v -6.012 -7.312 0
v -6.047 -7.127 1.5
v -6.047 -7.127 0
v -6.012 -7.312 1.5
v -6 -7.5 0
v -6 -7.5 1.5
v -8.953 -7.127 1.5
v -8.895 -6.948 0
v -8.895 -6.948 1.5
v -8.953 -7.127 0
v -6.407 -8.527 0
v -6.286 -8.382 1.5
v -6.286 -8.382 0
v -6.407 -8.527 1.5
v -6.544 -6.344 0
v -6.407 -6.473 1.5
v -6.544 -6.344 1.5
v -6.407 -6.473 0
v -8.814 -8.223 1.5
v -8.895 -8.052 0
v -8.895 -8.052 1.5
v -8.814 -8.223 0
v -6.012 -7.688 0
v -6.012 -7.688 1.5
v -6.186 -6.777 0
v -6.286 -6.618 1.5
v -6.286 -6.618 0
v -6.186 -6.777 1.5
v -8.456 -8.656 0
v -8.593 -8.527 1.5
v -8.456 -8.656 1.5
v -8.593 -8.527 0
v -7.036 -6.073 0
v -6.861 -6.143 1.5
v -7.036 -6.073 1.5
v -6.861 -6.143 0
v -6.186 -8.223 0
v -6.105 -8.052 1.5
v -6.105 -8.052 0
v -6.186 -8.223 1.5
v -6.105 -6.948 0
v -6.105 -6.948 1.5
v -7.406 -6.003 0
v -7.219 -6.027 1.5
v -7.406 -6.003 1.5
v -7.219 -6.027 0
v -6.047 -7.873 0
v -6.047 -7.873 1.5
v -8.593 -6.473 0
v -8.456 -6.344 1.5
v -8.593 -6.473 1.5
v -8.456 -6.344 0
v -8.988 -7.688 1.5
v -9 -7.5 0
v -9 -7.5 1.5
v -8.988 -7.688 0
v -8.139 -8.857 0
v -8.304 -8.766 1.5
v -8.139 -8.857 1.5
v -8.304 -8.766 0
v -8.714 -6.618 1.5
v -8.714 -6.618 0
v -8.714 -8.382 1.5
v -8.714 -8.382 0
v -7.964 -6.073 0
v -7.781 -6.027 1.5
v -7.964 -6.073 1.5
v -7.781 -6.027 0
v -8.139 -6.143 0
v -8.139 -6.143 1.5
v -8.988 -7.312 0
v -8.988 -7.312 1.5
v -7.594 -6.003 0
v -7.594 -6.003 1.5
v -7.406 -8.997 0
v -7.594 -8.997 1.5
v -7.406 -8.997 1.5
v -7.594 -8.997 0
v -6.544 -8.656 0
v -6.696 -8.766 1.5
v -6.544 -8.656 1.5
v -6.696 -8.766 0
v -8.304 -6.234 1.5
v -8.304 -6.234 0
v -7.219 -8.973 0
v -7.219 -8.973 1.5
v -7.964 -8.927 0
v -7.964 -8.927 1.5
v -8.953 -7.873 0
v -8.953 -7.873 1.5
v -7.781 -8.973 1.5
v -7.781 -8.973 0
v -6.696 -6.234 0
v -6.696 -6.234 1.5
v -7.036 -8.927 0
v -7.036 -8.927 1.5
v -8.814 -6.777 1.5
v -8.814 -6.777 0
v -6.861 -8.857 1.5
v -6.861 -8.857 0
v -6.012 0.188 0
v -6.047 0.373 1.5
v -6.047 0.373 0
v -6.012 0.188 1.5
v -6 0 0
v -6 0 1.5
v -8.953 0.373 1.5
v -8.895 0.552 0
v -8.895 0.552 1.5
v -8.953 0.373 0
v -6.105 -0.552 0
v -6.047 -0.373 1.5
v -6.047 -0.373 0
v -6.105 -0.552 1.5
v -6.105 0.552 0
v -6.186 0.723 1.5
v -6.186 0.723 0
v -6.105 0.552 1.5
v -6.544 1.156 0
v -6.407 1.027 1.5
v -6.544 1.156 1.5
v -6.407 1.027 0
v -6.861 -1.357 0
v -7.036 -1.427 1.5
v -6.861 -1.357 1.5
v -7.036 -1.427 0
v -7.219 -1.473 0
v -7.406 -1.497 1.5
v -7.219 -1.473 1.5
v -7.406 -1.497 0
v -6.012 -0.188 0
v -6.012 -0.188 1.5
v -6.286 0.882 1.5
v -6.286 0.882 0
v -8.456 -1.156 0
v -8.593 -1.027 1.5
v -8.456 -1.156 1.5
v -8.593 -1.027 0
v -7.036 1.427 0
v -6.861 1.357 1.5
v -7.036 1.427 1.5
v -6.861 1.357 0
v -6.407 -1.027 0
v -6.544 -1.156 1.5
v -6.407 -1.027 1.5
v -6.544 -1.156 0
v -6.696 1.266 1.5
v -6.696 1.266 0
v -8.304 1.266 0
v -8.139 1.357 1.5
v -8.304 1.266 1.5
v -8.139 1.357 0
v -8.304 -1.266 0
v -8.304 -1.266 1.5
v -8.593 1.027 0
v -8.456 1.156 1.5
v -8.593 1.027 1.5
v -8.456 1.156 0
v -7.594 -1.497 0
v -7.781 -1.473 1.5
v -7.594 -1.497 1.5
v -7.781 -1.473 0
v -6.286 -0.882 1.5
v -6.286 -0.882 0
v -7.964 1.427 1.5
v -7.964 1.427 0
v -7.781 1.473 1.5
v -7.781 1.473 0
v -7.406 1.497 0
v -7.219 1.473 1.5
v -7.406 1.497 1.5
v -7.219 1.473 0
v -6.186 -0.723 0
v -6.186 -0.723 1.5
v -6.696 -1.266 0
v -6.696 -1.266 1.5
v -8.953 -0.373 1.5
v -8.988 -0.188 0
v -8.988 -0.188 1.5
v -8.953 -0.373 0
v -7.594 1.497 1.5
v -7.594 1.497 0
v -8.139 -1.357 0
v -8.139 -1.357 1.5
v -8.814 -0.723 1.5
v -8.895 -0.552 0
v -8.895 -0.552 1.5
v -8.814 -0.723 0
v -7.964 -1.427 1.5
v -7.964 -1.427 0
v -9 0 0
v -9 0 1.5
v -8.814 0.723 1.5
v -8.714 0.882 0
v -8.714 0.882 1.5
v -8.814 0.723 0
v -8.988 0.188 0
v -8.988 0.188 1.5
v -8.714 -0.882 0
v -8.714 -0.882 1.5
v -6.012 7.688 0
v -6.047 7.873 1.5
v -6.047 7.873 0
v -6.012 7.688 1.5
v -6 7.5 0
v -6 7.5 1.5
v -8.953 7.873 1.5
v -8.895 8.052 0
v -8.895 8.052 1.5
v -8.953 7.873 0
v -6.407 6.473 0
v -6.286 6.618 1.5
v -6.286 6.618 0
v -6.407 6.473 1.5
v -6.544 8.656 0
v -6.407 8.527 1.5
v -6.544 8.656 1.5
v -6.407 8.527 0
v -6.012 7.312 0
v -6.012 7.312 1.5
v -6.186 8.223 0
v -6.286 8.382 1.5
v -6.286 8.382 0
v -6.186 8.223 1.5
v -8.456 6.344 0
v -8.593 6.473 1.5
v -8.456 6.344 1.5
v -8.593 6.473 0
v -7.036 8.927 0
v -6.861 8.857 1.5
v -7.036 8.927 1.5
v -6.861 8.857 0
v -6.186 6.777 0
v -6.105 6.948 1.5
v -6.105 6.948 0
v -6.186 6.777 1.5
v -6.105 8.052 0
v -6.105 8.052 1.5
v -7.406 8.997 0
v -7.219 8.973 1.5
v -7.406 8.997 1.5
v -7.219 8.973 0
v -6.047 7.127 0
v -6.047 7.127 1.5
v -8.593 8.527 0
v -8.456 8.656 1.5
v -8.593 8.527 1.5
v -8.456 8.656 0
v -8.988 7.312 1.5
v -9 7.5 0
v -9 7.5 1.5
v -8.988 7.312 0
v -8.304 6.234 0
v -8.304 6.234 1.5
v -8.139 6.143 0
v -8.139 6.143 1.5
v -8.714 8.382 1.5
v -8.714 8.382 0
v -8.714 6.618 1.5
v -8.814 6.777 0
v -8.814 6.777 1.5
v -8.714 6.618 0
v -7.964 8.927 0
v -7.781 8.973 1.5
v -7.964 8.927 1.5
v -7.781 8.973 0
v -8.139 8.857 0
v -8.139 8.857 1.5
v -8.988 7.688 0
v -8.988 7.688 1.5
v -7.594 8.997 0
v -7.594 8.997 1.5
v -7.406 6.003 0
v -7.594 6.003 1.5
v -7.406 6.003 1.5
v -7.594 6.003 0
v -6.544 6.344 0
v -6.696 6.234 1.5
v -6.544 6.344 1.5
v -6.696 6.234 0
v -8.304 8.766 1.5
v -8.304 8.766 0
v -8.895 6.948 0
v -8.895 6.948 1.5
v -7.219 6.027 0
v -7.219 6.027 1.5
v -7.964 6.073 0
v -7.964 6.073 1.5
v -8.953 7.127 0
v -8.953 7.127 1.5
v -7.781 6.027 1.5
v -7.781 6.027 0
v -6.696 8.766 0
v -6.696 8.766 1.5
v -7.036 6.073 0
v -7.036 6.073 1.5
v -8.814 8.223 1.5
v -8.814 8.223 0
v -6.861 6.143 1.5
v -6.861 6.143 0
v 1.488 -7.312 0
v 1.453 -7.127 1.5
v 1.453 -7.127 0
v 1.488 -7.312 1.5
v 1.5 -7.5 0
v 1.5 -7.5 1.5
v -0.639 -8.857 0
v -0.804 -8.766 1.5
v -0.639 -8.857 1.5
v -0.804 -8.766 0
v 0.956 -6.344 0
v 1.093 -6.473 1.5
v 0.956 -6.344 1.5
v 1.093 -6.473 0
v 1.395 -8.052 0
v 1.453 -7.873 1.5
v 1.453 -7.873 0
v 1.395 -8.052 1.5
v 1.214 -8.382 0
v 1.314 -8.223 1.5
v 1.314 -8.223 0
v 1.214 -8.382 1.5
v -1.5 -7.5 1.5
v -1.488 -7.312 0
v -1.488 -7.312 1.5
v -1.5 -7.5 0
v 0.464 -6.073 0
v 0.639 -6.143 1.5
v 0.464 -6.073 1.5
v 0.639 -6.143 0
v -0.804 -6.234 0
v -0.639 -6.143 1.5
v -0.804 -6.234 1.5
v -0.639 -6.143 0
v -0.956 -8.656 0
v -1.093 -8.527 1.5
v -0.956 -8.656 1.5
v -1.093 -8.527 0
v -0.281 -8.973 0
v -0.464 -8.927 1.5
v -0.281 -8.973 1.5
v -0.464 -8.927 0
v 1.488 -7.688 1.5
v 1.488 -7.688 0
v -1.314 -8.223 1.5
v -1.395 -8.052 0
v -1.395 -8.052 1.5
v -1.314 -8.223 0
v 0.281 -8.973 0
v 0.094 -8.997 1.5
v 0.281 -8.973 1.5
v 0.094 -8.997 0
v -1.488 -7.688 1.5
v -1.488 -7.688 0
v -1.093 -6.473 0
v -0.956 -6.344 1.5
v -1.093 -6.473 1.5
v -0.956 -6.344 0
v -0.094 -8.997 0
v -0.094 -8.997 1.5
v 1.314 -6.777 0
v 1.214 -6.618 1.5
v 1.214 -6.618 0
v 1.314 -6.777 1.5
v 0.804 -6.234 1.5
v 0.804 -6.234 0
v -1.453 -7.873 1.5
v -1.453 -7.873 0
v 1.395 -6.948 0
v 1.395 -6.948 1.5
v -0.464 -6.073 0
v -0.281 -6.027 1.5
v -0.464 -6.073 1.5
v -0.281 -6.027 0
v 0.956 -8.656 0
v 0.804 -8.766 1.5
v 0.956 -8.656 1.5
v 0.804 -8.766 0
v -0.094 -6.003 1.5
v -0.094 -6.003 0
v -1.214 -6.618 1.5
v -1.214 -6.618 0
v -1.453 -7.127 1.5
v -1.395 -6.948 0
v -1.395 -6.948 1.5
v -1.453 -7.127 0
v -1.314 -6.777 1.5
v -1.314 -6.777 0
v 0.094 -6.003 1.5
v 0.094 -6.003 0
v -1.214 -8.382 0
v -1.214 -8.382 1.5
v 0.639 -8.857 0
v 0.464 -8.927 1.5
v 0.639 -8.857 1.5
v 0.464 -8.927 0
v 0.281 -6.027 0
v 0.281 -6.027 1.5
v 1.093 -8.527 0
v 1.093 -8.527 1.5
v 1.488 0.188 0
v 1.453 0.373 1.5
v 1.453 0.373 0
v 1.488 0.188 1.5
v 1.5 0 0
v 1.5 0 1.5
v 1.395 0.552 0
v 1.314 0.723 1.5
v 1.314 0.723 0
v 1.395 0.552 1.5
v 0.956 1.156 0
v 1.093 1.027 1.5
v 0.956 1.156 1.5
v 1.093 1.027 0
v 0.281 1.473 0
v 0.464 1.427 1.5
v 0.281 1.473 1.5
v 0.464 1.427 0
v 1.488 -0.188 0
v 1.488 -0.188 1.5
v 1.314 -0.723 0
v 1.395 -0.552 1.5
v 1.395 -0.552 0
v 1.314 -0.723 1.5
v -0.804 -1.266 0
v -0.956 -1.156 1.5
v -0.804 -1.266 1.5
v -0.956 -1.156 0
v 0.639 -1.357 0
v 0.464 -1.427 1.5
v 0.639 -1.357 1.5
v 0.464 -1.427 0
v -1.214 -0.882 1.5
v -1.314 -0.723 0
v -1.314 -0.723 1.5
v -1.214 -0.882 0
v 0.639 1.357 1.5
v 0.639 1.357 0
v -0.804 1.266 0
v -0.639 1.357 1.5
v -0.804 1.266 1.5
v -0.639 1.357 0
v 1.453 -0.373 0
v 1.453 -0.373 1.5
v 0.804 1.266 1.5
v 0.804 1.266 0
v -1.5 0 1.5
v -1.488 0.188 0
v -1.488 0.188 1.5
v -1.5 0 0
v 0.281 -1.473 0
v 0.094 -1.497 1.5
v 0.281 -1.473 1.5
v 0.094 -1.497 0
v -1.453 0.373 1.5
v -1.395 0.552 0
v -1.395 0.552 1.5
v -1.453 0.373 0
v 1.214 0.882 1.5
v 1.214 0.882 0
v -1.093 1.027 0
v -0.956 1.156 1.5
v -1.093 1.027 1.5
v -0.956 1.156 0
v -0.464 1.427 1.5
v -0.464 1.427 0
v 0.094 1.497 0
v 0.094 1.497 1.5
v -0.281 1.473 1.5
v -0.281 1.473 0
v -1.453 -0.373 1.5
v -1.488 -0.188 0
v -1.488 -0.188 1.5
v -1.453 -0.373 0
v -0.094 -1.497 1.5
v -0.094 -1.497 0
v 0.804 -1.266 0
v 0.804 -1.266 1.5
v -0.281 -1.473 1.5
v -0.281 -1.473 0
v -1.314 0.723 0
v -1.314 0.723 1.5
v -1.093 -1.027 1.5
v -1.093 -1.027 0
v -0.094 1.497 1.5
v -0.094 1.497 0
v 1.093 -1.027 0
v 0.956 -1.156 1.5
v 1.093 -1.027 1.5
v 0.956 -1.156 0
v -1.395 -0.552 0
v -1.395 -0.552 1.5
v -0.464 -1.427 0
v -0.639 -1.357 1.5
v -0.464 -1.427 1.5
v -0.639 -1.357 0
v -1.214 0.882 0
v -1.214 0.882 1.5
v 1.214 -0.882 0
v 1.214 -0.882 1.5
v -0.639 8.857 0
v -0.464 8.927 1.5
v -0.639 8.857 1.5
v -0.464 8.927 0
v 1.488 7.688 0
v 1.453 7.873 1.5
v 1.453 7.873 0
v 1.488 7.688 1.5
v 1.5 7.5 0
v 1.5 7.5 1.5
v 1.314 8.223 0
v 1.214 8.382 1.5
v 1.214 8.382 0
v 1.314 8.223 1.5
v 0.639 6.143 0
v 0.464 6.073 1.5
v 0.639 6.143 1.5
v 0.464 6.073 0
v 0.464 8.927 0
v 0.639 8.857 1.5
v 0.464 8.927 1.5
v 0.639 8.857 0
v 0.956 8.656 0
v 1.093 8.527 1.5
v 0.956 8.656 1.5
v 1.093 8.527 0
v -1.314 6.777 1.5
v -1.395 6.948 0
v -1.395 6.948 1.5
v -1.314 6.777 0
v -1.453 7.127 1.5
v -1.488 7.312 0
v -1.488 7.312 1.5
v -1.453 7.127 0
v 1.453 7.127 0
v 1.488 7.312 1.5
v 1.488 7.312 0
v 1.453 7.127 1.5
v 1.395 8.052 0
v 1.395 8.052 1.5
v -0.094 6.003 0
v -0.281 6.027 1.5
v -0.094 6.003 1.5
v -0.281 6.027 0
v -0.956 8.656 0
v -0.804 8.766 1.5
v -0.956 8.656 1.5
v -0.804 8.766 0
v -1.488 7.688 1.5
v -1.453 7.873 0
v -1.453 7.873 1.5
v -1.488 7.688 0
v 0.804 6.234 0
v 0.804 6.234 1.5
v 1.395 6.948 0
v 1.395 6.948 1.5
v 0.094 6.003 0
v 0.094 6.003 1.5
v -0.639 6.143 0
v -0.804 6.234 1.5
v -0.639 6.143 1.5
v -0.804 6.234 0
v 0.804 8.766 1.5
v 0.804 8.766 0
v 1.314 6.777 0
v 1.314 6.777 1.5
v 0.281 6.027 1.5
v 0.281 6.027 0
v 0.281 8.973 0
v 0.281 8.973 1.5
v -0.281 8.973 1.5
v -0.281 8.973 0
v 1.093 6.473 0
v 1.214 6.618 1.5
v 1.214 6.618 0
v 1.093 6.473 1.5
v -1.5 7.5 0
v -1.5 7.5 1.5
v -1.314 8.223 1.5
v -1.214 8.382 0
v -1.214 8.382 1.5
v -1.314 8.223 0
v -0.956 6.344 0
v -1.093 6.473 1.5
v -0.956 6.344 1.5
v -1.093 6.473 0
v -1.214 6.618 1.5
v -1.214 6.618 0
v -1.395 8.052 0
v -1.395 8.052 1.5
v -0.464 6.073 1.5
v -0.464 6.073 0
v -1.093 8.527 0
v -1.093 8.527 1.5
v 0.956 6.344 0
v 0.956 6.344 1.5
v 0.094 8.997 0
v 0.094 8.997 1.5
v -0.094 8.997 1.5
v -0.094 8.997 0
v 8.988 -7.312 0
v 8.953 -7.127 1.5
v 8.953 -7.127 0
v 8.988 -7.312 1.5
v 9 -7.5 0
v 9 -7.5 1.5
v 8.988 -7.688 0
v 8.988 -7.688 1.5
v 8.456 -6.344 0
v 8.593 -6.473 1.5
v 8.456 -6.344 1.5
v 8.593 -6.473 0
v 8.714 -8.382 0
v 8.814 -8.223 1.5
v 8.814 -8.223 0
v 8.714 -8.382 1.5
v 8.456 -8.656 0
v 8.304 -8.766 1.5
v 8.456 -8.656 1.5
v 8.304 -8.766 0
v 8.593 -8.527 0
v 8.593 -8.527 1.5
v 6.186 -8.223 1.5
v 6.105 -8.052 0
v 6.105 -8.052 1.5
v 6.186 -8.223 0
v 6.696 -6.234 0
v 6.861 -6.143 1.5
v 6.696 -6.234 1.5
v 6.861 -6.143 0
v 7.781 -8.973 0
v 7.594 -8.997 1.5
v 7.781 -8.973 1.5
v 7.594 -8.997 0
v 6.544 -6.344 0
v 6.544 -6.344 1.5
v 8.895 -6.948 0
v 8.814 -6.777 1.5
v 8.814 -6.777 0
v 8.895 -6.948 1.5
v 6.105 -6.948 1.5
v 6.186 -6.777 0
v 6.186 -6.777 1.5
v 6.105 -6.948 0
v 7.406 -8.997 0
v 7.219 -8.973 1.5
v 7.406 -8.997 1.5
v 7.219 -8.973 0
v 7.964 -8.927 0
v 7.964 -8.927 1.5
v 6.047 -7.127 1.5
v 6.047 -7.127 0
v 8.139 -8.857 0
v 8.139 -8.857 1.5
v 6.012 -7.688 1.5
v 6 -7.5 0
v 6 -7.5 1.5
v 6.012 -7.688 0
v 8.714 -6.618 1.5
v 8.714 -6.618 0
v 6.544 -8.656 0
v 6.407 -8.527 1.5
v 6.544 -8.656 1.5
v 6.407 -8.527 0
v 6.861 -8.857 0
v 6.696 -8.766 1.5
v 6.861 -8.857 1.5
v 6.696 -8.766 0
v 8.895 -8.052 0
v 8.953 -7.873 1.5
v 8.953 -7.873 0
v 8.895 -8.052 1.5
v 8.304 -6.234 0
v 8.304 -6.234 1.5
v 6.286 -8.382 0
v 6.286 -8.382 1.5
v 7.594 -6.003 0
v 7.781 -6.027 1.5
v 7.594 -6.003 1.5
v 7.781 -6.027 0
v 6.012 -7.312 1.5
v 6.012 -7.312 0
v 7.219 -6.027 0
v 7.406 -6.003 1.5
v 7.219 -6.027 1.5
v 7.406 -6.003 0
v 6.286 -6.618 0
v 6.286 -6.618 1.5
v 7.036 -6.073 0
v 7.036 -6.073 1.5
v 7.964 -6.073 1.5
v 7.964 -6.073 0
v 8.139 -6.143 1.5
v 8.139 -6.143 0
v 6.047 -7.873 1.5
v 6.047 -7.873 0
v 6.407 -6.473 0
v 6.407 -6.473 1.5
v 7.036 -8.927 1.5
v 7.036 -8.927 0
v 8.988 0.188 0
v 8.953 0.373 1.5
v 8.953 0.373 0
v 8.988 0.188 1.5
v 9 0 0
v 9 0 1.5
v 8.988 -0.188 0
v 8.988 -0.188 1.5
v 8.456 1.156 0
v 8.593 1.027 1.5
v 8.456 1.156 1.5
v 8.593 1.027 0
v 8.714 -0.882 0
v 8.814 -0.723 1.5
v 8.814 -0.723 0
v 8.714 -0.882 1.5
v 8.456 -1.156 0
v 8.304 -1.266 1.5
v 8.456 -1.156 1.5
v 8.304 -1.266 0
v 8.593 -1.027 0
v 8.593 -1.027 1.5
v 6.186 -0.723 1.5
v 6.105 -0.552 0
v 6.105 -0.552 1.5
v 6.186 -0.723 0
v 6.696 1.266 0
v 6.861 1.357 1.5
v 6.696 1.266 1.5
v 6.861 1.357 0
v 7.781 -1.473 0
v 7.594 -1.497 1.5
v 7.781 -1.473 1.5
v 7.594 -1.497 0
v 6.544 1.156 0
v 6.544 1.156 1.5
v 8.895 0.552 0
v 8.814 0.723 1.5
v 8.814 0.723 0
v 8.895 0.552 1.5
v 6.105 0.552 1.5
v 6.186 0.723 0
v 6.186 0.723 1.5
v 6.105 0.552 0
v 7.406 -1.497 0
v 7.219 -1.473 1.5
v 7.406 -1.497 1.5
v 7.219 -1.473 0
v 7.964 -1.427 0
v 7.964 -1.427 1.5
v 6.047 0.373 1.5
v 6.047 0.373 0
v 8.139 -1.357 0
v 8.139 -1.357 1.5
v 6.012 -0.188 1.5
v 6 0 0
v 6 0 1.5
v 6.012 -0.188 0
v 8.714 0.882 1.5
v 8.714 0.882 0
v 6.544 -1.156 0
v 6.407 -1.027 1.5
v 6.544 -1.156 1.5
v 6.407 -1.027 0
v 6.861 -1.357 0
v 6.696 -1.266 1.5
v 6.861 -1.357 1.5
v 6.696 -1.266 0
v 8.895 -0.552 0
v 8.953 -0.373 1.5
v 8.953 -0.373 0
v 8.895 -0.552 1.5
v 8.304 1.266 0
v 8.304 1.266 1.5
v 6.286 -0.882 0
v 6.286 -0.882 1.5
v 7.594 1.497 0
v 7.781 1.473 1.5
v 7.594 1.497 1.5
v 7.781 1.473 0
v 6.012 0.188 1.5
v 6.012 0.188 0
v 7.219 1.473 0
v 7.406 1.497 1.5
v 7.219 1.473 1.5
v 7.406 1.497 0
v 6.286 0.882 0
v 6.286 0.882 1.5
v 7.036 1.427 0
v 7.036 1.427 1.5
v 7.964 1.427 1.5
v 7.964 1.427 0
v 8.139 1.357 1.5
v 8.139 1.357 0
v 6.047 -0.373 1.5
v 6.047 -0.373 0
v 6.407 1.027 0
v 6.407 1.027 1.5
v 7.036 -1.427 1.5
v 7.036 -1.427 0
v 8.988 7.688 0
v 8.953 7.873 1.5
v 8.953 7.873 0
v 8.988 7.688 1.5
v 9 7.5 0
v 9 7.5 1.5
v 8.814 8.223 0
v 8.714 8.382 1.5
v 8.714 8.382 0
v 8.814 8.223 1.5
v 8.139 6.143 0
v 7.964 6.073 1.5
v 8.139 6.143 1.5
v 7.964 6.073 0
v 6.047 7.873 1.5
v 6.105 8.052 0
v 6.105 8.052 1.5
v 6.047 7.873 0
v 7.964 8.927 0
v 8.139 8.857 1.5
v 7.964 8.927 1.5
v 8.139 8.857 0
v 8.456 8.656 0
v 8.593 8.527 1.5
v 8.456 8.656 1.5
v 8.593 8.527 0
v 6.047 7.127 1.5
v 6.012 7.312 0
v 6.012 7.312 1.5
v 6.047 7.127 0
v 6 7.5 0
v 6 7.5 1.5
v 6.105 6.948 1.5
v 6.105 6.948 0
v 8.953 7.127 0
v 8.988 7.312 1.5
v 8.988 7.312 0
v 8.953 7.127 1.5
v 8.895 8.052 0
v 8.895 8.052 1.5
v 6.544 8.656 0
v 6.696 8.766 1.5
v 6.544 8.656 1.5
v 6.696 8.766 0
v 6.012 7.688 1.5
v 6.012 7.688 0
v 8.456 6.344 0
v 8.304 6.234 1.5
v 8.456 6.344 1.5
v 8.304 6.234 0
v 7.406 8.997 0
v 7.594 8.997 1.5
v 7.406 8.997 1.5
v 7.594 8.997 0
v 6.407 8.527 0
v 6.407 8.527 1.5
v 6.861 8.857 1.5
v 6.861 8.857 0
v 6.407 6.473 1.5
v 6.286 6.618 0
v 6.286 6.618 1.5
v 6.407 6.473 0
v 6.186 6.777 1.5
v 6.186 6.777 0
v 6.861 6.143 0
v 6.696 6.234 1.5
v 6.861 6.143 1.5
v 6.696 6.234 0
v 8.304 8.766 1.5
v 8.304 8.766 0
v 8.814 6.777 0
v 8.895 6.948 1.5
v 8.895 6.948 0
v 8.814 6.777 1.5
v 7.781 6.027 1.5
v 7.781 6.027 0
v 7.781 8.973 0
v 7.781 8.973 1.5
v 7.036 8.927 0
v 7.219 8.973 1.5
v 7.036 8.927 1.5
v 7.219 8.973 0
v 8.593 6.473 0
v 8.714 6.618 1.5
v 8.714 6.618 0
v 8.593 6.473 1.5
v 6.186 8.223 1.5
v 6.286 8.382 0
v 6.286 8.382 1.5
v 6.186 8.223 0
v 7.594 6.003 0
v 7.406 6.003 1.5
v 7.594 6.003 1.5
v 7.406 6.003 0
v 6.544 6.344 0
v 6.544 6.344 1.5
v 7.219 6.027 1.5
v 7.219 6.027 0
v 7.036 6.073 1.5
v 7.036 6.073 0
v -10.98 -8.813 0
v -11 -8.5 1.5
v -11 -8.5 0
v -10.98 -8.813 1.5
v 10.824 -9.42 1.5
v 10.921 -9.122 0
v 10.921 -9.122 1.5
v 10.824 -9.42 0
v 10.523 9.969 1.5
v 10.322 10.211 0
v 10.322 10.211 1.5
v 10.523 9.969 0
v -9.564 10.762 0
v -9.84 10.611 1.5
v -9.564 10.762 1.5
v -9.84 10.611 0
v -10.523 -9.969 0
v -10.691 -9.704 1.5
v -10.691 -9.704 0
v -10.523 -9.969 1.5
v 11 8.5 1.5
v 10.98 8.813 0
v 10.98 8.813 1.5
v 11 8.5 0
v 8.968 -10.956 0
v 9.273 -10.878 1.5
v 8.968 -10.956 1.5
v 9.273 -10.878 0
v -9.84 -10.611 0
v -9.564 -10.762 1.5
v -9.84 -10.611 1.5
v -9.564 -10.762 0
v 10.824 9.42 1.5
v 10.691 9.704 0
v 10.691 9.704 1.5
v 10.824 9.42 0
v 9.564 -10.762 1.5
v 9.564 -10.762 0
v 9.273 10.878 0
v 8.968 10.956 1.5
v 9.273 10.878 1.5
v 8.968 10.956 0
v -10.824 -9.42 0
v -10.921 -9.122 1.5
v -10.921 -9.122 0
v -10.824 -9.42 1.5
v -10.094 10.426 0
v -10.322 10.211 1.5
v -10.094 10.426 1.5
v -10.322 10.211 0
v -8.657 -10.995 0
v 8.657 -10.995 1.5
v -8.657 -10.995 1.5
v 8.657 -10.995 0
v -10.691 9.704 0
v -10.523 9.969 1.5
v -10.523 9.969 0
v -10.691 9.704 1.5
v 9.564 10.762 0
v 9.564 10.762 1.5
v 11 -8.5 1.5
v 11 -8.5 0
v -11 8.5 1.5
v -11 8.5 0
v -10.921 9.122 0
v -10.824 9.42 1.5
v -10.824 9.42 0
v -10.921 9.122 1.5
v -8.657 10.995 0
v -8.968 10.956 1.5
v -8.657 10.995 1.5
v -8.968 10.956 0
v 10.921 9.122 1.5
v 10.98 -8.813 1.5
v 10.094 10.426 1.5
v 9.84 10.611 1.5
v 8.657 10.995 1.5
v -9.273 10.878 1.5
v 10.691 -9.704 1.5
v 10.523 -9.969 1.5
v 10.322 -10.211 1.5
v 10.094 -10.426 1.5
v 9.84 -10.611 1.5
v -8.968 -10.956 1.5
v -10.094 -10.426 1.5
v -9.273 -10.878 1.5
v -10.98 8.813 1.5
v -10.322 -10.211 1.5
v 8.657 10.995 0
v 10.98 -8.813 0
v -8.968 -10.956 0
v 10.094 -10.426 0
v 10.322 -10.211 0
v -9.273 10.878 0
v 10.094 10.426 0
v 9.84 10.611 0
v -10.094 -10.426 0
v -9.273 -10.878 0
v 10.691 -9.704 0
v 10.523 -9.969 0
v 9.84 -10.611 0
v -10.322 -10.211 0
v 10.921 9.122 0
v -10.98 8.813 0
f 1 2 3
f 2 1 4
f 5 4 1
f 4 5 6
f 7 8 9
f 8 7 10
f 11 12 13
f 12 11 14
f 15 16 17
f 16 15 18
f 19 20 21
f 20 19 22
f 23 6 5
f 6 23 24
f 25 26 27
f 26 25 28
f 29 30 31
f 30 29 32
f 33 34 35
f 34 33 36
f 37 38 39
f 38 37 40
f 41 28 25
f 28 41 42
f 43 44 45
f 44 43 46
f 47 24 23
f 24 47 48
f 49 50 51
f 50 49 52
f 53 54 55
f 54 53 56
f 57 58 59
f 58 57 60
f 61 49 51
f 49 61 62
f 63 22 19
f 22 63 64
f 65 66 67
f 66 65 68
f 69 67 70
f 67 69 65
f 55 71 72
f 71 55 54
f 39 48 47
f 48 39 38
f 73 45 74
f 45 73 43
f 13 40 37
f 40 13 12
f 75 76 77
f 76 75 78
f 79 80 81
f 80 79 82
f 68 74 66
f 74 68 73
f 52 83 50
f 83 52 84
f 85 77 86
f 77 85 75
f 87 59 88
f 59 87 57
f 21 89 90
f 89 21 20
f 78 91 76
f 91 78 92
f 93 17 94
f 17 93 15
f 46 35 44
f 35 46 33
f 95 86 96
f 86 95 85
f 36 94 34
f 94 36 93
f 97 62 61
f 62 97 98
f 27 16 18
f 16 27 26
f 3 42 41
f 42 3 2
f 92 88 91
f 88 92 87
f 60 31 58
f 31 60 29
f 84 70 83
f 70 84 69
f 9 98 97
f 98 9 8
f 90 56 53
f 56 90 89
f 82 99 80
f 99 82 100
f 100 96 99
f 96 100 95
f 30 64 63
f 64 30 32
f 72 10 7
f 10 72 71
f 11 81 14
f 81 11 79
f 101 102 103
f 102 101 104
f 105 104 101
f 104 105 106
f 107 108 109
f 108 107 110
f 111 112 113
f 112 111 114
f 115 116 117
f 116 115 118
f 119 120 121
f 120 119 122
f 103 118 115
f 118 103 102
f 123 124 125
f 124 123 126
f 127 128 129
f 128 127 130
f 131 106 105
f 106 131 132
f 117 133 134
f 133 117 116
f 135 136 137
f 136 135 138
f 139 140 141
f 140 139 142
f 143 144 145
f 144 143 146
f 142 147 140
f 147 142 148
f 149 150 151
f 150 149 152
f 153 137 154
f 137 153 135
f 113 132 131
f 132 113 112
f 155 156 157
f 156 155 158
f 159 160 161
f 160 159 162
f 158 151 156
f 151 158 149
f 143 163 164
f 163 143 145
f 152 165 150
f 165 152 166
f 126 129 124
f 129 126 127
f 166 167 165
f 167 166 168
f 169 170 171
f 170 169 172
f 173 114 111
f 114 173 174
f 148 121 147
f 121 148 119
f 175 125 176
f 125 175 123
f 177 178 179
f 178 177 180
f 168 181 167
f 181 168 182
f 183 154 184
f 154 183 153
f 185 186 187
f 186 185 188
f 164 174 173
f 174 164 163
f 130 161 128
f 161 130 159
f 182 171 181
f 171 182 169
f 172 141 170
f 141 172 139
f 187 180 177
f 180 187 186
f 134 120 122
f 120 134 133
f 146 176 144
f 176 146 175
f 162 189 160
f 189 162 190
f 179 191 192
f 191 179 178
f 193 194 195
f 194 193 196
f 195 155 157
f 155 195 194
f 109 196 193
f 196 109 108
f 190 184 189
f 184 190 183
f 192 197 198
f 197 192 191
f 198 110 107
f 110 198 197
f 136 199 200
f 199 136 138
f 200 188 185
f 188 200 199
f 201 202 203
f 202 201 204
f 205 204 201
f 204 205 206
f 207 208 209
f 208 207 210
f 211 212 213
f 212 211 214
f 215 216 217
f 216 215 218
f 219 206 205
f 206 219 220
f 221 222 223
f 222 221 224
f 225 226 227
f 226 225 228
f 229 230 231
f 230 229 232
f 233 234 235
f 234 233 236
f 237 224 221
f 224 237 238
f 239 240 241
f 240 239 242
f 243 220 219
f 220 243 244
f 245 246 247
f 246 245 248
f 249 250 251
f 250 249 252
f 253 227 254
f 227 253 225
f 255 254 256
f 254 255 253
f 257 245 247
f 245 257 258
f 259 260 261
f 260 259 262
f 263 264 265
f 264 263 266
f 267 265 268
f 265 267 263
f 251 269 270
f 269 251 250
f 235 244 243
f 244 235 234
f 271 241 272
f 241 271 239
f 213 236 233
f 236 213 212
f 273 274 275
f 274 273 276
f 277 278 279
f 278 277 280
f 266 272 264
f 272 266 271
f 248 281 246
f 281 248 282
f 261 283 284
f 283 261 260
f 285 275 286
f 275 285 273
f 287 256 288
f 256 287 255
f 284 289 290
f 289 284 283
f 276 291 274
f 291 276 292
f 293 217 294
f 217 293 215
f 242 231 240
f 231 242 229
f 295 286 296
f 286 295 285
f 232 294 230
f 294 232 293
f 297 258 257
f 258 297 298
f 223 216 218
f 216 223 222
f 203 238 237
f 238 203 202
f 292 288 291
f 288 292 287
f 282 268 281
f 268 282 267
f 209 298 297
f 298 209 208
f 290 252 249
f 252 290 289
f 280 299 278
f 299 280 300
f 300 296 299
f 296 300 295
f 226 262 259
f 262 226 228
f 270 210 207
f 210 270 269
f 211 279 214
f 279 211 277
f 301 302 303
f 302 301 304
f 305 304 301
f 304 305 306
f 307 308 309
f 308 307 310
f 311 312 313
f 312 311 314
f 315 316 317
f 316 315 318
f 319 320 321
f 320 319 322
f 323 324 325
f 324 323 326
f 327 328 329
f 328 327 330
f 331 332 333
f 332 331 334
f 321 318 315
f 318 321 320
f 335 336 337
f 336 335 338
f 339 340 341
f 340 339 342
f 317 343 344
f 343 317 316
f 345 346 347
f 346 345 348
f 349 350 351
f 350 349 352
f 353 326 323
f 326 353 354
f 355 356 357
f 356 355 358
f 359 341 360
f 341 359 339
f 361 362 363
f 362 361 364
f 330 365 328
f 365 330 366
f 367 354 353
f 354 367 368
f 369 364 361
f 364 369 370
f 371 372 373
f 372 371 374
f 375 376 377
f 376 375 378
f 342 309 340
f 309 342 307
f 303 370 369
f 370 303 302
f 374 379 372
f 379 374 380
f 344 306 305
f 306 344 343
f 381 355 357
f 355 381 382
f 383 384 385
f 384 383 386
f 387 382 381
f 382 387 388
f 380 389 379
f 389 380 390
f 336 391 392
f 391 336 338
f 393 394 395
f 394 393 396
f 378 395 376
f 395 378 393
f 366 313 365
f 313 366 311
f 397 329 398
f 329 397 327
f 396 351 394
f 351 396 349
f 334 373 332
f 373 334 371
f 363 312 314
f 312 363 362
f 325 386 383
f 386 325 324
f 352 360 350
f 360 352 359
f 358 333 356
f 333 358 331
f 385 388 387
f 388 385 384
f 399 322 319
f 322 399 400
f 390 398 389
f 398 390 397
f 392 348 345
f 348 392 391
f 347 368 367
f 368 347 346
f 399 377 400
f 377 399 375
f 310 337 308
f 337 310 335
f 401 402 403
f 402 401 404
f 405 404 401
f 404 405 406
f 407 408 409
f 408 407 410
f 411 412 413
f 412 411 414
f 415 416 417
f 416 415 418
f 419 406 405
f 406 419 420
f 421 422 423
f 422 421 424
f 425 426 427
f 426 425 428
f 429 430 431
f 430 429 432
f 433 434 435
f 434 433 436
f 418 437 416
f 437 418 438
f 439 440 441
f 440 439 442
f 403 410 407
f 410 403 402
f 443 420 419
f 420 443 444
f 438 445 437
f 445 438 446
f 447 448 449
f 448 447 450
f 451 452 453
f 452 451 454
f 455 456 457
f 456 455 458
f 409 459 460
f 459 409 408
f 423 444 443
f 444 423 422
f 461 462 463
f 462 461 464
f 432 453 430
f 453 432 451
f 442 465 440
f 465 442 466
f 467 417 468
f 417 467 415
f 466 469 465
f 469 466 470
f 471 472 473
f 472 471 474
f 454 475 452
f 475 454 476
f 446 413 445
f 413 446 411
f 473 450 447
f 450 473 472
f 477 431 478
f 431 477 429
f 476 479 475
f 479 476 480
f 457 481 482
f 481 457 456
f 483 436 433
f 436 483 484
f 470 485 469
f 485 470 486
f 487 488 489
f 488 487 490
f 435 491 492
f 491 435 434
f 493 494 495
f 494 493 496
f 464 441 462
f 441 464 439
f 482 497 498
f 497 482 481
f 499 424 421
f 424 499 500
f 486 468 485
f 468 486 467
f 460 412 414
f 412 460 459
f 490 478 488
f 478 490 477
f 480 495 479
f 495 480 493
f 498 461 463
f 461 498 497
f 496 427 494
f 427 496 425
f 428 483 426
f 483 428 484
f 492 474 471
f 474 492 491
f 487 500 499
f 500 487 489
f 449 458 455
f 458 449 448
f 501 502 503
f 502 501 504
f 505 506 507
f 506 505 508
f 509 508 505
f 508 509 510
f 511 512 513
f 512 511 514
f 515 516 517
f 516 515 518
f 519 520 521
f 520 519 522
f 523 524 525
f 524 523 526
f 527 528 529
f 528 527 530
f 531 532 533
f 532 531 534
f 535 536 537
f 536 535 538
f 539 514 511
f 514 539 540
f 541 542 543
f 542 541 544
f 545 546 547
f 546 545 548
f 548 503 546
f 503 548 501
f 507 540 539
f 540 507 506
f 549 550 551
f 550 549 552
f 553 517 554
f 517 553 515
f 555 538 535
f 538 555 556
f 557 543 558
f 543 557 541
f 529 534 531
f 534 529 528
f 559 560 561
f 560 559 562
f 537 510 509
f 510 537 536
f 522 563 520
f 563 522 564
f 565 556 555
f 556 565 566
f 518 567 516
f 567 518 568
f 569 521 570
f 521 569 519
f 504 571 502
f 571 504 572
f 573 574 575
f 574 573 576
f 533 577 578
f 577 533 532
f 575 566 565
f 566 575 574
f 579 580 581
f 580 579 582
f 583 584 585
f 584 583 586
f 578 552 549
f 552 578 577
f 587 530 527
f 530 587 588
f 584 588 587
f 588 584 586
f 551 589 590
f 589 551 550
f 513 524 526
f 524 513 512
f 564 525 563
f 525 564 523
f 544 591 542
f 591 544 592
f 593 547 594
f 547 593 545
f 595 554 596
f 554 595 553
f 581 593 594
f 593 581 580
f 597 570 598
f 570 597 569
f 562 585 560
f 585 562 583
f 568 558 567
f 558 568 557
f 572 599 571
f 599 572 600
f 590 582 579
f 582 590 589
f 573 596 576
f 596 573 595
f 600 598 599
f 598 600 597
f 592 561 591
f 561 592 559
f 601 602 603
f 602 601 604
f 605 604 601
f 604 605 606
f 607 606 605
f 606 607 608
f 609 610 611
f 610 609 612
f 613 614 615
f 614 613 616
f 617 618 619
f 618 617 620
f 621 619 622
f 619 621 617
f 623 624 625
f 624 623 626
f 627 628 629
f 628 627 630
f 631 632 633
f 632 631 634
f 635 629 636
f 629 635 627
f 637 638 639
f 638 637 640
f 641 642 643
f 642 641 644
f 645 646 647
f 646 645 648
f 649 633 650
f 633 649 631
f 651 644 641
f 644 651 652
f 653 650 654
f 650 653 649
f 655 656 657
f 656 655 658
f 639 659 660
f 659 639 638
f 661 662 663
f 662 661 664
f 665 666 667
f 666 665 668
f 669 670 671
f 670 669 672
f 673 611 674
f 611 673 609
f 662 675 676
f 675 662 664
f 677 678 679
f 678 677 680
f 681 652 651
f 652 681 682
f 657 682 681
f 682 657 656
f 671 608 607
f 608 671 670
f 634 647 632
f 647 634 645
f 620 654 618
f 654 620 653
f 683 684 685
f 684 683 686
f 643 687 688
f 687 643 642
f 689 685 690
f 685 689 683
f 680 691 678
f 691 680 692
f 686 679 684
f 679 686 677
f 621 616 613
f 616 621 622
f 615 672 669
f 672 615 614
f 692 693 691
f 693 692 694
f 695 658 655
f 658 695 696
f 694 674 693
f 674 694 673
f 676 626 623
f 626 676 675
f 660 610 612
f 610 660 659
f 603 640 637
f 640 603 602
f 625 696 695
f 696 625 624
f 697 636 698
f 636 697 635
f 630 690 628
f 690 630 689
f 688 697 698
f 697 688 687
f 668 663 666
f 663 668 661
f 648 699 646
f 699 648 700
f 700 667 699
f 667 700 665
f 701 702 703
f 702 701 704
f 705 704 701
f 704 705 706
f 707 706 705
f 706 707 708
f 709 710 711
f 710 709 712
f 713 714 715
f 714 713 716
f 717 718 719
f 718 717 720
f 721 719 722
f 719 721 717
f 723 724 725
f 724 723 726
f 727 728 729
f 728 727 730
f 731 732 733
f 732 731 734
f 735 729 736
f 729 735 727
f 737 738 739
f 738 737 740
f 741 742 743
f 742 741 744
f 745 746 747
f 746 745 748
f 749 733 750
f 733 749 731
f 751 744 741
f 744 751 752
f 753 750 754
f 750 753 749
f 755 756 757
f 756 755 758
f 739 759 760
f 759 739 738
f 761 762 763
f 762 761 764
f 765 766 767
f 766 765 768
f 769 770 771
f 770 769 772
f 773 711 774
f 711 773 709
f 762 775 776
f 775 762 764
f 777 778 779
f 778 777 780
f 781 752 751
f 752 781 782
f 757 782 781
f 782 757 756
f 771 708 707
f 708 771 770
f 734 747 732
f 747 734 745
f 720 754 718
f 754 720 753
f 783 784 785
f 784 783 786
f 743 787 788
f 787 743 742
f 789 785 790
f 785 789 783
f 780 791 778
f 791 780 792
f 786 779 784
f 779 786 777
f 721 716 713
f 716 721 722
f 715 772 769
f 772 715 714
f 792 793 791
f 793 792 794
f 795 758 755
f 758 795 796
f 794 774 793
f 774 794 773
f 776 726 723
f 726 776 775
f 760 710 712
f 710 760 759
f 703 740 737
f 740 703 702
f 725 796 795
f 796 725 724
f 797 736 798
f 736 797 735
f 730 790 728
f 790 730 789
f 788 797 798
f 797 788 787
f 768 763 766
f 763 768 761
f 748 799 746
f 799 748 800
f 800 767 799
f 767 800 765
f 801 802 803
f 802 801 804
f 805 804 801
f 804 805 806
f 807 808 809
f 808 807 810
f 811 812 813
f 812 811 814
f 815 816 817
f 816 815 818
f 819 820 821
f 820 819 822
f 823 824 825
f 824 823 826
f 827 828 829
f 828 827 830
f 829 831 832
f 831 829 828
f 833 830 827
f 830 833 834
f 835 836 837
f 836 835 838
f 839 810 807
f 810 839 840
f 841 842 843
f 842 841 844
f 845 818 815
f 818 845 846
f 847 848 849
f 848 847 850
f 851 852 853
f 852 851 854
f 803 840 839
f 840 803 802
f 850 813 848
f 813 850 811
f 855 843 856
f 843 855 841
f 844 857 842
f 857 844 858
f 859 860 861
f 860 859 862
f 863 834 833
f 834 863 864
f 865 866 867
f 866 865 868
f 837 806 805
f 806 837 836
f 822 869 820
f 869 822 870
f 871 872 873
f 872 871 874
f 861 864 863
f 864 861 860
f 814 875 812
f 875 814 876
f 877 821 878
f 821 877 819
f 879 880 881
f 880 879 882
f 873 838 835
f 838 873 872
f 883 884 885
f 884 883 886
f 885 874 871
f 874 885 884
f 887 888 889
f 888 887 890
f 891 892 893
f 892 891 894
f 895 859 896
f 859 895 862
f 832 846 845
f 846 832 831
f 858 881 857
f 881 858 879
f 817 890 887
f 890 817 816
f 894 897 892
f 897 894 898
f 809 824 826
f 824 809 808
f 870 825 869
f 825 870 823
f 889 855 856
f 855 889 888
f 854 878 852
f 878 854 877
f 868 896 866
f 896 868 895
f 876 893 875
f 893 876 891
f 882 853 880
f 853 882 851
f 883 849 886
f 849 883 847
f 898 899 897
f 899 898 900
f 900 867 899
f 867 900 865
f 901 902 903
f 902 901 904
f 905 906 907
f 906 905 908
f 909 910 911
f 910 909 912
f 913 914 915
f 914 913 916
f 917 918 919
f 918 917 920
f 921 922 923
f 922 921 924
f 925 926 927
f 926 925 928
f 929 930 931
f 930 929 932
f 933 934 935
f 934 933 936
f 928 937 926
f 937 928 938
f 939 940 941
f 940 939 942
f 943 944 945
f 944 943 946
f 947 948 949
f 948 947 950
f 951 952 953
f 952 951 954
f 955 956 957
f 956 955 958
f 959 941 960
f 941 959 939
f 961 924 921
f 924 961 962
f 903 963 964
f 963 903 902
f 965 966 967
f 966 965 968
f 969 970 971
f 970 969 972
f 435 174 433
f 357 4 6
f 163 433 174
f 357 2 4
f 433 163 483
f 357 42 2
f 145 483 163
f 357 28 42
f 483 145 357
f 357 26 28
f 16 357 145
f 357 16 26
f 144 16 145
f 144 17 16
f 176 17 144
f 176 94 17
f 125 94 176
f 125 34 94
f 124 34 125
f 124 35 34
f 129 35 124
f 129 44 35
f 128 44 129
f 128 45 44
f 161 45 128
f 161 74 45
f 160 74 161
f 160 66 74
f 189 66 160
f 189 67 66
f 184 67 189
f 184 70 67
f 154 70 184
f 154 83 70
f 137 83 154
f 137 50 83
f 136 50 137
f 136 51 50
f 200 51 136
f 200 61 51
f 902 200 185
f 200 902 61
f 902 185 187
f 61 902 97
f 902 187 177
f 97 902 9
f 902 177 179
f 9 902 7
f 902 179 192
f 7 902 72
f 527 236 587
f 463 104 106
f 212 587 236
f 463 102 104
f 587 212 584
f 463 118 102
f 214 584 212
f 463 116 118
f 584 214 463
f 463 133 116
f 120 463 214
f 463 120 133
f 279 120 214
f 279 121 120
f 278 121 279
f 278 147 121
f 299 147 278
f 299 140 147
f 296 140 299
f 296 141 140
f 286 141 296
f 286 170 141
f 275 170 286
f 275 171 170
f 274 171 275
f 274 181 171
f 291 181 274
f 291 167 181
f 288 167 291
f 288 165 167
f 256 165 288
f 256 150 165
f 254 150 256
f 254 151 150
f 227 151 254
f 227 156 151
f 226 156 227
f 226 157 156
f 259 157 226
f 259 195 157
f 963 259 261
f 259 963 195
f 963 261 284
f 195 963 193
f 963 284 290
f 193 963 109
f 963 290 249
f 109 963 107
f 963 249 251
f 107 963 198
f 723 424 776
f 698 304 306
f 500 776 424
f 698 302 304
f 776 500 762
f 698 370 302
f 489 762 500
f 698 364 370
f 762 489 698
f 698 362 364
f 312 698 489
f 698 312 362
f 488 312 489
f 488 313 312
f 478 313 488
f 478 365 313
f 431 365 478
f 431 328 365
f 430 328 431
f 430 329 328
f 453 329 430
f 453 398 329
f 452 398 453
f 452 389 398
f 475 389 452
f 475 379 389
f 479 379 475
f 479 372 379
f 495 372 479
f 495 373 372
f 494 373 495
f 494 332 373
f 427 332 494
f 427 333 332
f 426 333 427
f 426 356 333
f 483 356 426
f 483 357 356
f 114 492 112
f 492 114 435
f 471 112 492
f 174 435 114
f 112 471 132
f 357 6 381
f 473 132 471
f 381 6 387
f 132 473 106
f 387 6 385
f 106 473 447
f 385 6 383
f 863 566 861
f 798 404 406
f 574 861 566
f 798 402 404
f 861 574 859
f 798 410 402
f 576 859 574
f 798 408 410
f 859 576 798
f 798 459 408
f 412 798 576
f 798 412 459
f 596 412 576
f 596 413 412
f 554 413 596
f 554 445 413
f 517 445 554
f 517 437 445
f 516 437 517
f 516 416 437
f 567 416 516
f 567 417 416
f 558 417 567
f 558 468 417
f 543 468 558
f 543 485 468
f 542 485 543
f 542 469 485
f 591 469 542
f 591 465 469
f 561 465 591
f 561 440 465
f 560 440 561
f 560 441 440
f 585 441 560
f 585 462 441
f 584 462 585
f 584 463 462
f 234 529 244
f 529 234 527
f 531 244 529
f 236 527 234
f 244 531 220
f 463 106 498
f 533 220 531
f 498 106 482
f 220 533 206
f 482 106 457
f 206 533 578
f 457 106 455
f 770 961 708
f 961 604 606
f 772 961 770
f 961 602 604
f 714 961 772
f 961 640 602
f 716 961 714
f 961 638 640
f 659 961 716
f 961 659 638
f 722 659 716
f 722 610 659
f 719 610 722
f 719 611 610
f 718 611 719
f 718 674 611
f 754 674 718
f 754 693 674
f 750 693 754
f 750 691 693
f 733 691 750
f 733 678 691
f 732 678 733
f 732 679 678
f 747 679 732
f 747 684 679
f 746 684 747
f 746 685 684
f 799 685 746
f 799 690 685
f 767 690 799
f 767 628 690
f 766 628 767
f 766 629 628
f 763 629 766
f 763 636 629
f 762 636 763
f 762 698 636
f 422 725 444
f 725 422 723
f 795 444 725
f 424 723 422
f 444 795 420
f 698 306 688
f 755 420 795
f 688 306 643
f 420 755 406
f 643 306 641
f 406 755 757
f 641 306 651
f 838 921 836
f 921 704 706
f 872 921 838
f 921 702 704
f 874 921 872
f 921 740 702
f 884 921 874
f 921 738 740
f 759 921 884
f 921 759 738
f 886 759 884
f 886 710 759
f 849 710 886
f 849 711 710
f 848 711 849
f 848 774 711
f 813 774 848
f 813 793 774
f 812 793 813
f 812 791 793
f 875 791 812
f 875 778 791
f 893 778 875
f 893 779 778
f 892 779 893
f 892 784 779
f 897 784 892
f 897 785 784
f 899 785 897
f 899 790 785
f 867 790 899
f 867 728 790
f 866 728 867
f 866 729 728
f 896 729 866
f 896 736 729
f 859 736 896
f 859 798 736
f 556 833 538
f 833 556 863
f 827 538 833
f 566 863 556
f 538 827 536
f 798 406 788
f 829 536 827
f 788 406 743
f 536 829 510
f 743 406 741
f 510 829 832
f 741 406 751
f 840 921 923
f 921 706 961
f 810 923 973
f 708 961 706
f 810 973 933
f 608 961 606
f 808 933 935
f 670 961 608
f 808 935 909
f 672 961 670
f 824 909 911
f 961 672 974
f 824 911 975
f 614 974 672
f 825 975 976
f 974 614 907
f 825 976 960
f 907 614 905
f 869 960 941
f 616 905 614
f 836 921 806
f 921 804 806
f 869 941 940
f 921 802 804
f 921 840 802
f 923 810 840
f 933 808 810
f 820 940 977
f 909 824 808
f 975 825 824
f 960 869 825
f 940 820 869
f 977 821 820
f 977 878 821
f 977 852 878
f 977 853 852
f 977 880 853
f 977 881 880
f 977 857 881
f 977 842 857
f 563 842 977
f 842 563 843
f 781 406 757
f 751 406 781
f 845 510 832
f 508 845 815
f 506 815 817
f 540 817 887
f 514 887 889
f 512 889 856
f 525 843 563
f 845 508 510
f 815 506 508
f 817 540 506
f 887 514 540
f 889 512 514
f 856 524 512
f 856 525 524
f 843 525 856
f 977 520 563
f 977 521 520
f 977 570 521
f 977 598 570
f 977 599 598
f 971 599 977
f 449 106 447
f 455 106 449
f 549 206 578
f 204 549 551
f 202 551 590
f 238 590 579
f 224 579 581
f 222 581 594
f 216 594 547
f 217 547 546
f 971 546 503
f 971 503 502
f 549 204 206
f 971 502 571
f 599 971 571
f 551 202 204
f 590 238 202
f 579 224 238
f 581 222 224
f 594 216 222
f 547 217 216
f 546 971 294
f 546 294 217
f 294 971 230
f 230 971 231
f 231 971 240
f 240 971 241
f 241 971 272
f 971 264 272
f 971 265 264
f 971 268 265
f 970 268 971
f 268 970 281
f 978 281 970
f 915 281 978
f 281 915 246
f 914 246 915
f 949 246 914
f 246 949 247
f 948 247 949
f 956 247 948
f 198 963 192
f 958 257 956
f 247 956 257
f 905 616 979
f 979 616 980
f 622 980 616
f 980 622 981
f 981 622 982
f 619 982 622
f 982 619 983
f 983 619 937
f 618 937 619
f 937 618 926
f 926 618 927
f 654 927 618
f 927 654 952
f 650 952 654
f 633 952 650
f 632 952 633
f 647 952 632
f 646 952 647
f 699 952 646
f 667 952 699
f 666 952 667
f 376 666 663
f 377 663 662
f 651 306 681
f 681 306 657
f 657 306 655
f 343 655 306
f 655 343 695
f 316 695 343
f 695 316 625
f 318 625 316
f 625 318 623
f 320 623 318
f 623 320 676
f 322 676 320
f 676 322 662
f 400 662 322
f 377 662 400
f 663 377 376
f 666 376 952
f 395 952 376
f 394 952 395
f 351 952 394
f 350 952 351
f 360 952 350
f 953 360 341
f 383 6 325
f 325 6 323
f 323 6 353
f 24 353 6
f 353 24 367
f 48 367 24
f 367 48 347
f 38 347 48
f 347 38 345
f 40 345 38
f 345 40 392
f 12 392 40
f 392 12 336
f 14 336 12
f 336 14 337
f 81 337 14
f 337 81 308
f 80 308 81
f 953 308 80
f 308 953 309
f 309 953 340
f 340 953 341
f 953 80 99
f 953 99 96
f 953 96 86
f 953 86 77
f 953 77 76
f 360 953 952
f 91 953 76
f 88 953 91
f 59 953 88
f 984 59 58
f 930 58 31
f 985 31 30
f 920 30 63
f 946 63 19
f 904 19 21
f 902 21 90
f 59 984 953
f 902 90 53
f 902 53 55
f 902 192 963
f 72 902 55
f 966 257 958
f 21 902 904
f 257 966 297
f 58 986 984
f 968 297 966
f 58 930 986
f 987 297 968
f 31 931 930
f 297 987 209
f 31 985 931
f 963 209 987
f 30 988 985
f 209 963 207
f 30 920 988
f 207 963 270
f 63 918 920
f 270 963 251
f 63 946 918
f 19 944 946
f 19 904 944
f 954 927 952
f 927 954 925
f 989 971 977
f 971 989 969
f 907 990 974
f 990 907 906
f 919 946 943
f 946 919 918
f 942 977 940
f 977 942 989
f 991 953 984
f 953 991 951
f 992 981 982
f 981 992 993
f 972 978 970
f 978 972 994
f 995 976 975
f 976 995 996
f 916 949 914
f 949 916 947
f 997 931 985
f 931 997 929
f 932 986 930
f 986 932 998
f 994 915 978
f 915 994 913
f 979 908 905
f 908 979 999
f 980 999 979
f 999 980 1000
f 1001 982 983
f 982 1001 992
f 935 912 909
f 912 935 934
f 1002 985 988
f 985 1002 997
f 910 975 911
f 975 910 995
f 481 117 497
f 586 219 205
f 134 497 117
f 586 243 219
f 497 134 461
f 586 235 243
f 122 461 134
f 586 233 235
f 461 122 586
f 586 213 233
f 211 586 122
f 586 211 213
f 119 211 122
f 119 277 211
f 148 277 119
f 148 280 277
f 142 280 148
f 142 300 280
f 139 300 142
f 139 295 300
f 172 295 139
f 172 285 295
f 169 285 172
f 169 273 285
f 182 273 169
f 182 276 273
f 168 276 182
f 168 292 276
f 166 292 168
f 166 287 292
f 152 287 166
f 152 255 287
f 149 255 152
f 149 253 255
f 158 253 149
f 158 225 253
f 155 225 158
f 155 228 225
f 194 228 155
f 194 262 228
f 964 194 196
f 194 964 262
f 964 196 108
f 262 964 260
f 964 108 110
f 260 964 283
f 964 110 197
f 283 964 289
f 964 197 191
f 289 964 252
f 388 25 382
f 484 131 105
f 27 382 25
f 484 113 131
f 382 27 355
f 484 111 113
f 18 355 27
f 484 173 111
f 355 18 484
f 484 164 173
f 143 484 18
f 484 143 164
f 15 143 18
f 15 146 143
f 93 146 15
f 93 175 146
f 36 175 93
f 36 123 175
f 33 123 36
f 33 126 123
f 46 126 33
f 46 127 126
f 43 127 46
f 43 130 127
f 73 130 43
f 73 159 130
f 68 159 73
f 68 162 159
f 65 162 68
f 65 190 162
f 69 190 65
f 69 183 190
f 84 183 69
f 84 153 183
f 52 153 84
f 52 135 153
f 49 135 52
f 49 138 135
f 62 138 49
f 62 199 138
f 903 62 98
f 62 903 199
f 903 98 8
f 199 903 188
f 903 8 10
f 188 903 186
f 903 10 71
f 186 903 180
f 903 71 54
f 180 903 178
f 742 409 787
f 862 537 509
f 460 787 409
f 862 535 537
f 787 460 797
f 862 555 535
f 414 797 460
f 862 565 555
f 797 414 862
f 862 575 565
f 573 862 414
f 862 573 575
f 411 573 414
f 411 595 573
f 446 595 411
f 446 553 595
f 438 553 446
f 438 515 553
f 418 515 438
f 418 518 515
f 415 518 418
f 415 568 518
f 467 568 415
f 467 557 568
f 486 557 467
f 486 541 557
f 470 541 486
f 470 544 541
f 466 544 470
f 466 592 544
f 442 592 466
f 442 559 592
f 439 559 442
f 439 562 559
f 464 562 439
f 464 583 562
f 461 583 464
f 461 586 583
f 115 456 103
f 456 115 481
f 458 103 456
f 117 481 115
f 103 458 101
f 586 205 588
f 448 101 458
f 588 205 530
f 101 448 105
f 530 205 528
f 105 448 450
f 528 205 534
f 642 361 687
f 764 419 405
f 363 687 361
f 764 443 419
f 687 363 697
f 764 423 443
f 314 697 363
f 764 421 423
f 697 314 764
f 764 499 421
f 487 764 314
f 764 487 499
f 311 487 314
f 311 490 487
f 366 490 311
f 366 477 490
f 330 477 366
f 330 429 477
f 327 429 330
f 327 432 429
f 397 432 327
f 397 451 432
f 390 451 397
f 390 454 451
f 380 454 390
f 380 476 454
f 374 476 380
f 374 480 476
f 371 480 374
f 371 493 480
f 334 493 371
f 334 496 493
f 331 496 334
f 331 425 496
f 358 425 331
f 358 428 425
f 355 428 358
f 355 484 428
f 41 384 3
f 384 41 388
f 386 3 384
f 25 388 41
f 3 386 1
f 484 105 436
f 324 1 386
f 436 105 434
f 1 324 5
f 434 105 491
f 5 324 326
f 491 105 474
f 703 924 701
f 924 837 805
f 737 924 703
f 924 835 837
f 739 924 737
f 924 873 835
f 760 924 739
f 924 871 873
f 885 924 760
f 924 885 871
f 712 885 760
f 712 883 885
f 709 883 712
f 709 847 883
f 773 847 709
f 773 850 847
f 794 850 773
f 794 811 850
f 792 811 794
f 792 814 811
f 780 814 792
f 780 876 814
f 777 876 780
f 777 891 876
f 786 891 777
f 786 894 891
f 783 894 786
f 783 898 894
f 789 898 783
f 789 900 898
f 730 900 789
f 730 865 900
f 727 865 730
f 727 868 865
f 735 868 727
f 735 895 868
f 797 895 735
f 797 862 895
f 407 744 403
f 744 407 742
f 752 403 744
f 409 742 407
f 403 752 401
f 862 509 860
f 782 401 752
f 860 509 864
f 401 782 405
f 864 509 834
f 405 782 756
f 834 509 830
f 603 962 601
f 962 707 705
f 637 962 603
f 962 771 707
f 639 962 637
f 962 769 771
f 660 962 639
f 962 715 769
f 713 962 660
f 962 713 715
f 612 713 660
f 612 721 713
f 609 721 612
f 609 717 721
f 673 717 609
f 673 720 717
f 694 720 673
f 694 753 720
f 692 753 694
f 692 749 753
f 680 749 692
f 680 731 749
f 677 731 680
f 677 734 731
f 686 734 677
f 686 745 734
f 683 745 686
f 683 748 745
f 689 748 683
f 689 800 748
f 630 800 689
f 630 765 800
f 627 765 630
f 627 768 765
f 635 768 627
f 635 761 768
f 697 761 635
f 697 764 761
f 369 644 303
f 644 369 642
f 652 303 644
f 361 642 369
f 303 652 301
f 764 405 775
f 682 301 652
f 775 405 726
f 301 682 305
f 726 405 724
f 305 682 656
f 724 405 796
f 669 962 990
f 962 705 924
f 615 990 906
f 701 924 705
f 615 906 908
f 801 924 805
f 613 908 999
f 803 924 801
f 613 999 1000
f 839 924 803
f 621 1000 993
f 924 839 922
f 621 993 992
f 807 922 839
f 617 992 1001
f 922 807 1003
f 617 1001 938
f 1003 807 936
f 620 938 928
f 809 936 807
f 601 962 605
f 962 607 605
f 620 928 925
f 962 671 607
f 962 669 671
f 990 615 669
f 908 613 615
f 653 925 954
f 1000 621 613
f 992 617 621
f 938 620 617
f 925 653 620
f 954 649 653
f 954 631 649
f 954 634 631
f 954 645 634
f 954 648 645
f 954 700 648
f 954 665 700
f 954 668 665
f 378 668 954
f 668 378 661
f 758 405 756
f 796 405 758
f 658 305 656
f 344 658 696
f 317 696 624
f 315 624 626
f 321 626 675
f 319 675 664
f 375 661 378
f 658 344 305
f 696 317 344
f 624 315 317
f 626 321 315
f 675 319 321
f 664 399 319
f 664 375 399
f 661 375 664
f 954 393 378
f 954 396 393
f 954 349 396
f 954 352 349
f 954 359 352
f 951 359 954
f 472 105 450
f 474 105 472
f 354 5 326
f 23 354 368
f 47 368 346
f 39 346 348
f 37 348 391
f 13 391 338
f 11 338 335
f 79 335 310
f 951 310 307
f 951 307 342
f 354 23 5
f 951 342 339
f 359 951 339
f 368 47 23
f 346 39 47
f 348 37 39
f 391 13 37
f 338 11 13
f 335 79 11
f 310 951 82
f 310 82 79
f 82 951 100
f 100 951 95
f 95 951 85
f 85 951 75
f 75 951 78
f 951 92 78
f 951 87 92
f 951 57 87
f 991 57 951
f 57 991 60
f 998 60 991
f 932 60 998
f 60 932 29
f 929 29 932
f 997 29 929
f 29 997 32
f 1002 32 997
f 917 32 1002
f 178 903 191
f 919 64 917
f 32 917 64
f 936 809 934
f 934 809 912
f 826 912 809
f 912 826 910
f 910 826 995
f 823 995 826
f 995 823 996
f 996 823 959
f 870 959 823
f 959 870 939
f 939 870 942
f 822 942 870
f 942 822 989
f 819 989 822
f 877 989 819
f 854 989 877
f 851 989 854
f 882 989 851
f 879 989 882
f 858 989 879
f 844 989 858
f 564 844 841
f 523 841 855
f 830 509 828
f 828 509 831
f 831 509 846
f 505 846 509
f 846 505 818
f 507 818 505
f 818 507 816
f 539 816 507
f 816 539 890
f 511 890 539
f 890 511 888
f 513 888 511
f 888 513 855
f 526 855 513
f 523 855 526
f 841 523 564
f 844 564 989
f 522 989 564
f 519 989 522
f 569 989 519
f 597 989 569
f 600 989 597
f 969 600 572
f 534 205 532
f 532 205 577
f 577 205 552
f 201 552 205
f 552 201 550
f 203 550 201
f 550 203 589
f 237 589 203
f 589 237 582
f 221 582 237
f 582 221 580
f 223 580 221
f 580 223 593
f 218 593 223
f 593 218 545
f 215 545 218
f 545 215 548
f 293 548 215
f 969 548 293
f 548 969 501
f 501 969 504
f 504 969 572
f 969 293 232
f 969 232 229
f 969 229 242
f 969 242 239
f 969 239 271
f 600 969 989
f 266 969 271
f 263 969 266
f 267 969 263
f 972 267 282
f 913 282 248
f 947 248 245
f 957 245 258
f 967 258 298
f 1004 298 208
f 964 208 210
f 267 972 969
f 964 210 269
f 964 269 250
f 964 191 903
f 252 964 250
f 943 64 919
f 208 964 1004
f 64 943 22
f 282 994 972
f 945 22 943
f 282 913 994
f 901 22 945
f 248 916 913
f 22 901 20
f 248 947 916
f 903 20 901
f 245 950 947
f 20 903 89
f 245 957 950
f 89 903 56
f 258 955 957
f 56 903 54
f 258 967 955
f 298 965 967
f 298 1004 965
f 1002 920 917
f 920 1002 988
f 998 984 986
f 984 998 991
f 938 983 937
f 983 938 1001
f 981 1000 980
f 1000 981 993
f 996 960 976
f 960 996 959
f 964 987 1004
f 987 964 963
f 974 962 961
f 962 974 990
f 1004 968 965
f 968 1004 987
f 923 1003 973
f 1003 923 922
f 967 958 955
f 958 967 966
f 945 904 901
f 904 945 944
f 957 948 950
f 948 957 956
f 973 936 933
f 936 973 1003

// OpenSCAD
$fn = 50;


difference() {
	union() {
		translate(v = [0, 0, 0]) {
			rotate(a = [0, 0, 0]) {
				hull() {
					translate(v = [-8.5000000000, 8.5000000000, 0]) {
						rotate(a = [0, 0, 0]) {
							translate(v = [0, 0, 0]) {
								rotate(a = [0, 0, 0]) {
									cylinder(h = 1.5000000000, r = 2.5000000000);
								}
							}
						}
					}
					translate(v = [8.5000000000, 8.5000000000, 0]) {
						rotate(a = [0, 0, 0]) {
							translate(v = [0, 0, 0]) {
								rotate(a = [0, 0, 0]) {
									cylinder(h = 1.5000000000, r = 2.5000000000);
								}
							}
						}
					}
					translate(v = [-8.5000000000, -8.5000000000, 0]) {
						rotate(a = [0, 0, 0]) {
							translate(v = [0, 0, 0]) {
								rotate(a = [0, 0, 0]) {
									cylinder(h = 1.5000000000, r = 2.5000000000);
								}
							}
						}
					}
					translate(v = [8.5000000000, -8.5000000000, 0]) {
						rotate(a = [0, 0, 0]) {
							translate(v = [0, 0, 0]) {
								rotate(a = [0, 0, 0]) {
									cylinder(h = 1.5000000000, r = 2.5000000000);
								}
							}
						}
					}
				}
			}
		}
	}
	union() {
		translate(v = [-7.5000000000, -7.5000000000, 0]) {
			rotate(a = [0, 0, 0]) {
				translate(v = [0, 0, -50]) {
					rotate(a = [0, 0, 0]) {
						cylinder(h = 100, r = 1.5000000000);
					}
				}
			}
		}
		translate(v = [-7.5000000000, 0.0000000000, 0]) {
			rotate(a = [0, 0, 0]) {
				translate(v = [0, 0, -50]) {
					rotate(a = [0, 0, 0]) {
						cylinder(h = 100, r = 1.5000000000);
					}
				}
			}
		}
		translate(v = [-7.5000000000, 7.5000000000, 0]) {
			rotate(a = [0, 0, 0]) {
				translate(v = [0, 0, -50]) {
					rotate(a = [0, 0, 0]) {
						cylinder(h = 100, r = 1.5000000000);
					}
				}
			}
		}
		translate(v = [0.0000000000, -7.5000000000, 0]) {
			rotate(a = [0, 0, 0]) {
				translate(v = [0, 0, -50]) {
					rotate(a = [0, 0, 0]) {
						cylinder(h = 100, r = 1.5000000000);
					}
				}
			}
		}
		translate(v = [0.0000000000, 0.0000000000, 0]) {
			rotate(a = [0, 0, 0]) {
				translate(v = [0, 0, -50]) {
					rotate(a = [0, 0, 0]) {
						cylinder(h = 100, r = 1.5000000000);
					}
				}
			}
		}
		translate(v = [0.0000000000, 7.5000000000, 0]) {
			rotate(a = [0, 0, 0]) {
				translate(v = [0, 0, -50]) {
					rotate(a = [0, 0, 0]) {
						cylinder(h = 100, r = 1.5000000000);
					}
				}
			}
		}
		translate(v = [7.5000000000, -7.5000000000, 0]) {
			rotate(a = [0, 0, 0]) {
				translate(v = [0, 0, -50]) {
					rotate(a = [0, 0, 0]) {
						cylinder(h = 100, r = 1.5000000000);
					}
				}
			}
		}
		translate(v = [7.5000000000, 0.0000000000, 0]) {
			rotate(a = [0, 0, 0]) {
				translate(v = [0, 0, -50]) {
					rotate(a = [0, 0, 0]) {
						cylinder(h = 100, r = 1.5000000000);
					}
				}
			}
		}
		translate(v = [7.5000000000, 7.5000000000, 0]) {
			rotate(a = [0, 0, 0]) {
				translate(v = [0, 0, -50]) {
					rotate(a = [0, 0, 0]) {
						cylinder(h = 100, r = 1.5000000000);
					}
				}
			}
		}
	}
}
